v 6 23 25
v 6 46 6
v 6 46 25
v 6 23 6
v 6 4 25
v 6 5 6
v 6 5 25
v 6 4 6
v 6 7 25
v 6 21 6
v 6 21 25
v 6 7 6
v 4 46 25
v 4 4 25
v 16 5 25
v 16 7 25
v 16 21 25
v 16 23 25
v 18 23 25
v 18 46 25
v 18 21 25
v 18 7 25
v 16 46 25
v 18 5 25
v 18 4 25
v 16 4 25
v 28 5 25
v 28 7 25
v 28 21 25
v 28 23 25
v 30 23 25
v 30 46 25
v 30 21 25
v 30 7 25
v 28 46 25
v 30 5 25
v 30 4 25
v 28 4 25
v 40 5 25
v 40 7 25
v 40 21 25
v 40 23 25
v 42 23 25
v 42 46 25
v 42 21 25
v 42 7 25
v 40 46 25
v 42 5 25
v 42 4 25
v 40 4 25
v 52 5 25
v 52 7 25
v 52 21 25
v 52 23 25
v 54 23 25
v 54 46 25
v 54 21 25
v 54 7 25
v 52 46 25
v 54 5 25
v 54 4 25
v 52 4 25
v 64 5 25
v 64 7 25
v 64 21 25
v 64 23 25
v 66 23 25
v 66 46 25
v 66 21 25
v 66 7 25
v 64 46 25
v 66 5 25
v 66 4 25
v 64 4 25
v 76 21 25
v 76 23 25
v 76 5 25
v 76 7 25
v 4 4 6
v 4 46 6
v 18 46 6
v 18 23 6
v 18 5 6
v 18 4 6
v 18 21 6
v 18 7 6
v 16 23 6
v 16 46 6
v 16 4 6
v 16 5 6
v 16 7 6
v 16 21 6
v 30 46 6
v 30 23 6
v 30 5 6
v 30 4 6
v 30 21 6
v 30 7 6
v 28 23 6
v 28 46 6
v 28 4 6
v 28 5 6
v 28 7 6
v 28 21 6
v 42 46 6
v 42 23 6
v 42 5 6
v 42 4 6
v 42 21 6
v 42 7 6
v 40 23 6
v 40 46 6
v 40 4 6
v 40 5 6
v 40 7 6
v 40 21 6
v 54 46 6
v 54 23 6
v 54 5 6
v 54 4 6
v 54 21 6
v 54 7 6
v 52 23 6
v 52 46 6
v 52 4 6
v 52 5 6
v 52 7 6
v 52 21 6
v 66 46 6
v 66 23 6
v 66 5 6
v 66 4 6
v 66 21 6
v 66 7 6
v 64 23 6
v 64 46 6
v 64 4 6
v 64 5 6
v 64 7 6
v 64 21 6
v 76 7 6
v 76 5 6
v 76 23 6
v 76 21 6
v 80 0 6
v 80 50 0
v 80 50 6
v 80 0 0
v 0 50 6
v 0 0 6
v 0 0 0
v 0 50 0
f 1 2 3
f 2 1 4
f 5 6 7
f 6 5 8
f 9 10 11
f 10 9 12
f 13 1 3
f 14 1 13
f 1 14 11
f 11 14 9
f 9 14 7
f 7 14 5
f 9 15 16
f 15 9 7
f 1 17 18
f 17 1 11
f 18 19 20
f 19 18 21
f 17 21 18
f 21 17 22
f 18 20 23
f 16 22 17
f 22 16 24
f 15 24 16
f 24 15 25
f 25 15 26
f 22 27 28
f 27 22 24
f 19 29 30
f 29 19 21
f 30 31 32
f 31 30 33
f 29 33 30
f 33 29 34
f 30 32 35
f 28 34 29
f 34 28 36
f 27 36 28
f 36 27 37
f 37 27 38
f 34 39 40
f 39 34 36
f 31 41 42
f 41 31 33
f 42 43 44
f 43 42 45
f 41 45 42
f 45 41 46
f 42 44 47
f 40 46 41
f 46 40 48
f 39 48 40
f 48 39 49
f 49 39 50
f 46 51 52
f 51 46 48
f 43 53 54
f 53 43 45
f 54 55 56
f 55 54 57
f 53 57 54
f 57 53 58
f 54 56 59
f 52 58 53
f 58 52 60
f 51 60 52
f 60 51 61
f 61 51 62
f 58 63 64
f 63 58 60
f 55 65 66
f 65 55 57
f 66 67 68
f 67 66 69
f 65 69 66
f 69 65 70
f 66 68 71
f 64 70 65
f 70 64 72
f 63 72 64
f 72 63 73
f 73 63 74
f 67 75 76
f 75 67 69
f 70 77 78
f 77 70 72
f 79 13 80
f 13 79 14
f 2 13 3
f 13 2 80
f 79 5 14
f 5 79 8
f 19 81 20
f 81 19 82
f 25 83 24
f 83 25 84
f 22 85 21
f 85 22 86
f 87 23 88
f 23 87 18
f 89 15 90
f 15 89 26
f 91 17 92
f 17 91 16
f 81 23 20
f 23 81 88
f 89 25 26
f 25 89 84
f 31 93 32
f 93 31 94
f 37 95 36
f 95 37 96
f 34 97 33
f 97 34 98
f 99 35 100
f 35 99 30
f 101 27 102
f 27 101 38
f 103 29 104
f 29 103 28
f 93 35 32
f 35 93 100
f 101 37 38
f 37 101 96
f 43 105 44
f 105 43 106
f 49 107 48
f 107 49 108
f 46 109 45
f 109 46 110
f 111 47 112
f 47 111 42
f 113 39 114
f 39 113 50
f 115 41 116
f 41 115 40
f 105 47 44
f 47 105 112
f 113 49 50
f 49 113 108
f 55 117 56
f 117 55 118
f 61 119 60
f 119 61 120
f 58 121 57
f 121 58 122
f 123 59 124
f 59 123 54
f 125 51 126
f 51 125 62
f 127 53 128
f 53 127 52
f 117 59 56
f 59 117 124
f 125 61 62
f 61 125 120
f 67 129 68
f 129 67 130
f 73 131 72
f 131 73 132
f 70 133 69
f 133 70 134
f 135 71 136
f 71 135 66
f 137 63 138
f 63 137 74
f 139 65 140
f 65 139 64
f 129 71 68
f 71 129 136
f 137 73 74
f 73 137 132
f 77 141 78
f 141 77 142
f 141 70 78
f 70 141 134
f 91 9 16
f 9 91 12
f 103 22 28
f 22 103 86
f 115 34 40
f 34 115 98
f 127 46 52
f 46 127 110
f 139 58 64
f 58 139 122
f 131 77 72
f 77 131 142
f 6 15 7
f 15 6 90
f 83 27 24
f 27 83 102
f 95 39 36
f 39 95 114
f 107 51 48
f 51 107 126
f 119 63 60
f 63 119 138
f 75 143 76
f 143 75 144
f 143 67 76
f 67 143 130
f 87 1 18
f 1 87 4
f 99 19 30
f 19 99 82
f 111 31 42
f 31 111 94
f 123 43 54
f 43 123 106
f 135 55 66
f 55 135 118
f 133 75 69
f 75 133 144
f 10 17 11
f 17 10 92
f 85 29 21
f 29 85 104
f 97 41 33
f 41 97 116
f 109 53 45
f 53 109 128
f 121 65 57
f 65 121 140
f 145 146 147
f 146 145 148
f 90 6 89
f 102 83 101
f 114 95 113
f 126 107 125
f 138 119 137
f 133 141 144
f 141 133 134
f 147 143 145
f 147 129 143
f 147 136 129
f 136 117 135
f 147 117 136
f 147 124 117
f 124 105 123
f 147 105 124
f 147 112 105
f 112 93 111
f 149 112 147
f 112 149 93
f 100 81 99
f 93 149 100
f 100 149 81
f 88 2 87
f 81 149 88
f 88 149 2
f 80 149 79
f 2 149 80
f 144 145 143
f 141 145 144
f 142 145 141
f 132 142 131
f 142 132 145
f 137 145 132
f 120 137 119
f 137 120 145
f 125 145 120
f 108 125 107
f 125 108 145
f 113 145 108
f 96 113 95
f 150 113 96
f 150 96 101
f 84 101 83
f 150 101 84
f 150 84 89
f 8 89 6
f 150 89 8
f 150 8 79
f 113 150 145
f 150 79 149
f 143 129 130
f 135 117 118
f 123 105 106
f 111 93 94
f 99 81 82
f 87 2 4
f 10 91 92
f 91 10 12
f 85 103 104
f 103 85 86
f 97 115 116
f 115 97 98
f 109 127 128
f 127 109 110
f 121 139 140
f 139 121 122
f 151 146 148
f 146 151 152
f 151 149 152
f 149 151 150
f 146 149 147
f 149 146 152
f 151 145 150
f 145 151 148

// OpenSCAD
$fn = 32;

// ----------------------------------------------------------------------
// Heatsink: cross fin block
// ----------------------------------------------------------------------

// --- parameters (mm) ---
base_l = 80;              // base length, X
base_w = 50;              // base width, Y
base_t = 6;               // base plate thickness
fin_h = 20;               // fin height above the base
fin_t = 2;                // fin thickness
edge = 4;                 // margin from the base ends
pitch = 12;               // fin pitch
rib_pitch = 16;           // cross rib pitch
fit_tol = 0.05;           // tolerance for press fits, mm
free_tol = 0.2;           // tolerance for clearance fits, mm

n_fins = floor((base_l - 2 * edge - fin_t) / pitch) + 1;  // fin count
total_h = base_t + fin_h - 1;  // overall height
n_ribs = floor((base_w - 2 * edge) / rib_pitch);  // rib count

union() {
  cube([base_l, base_w, base_t]);
  for (i = [0 : n_fins - 1])
    translate([edge + i * pitch, edge, base_t - 1])
      cube([fin_t, base_w - 2 * edge, fin_h]);
  for (i = [0 : n_ribs - 1])
    translate([edge, edge + 1 + i * rib_pitch, base_t - 1])
      cube([base_l - 2 * edge, fin_t, fin_h]);
}
